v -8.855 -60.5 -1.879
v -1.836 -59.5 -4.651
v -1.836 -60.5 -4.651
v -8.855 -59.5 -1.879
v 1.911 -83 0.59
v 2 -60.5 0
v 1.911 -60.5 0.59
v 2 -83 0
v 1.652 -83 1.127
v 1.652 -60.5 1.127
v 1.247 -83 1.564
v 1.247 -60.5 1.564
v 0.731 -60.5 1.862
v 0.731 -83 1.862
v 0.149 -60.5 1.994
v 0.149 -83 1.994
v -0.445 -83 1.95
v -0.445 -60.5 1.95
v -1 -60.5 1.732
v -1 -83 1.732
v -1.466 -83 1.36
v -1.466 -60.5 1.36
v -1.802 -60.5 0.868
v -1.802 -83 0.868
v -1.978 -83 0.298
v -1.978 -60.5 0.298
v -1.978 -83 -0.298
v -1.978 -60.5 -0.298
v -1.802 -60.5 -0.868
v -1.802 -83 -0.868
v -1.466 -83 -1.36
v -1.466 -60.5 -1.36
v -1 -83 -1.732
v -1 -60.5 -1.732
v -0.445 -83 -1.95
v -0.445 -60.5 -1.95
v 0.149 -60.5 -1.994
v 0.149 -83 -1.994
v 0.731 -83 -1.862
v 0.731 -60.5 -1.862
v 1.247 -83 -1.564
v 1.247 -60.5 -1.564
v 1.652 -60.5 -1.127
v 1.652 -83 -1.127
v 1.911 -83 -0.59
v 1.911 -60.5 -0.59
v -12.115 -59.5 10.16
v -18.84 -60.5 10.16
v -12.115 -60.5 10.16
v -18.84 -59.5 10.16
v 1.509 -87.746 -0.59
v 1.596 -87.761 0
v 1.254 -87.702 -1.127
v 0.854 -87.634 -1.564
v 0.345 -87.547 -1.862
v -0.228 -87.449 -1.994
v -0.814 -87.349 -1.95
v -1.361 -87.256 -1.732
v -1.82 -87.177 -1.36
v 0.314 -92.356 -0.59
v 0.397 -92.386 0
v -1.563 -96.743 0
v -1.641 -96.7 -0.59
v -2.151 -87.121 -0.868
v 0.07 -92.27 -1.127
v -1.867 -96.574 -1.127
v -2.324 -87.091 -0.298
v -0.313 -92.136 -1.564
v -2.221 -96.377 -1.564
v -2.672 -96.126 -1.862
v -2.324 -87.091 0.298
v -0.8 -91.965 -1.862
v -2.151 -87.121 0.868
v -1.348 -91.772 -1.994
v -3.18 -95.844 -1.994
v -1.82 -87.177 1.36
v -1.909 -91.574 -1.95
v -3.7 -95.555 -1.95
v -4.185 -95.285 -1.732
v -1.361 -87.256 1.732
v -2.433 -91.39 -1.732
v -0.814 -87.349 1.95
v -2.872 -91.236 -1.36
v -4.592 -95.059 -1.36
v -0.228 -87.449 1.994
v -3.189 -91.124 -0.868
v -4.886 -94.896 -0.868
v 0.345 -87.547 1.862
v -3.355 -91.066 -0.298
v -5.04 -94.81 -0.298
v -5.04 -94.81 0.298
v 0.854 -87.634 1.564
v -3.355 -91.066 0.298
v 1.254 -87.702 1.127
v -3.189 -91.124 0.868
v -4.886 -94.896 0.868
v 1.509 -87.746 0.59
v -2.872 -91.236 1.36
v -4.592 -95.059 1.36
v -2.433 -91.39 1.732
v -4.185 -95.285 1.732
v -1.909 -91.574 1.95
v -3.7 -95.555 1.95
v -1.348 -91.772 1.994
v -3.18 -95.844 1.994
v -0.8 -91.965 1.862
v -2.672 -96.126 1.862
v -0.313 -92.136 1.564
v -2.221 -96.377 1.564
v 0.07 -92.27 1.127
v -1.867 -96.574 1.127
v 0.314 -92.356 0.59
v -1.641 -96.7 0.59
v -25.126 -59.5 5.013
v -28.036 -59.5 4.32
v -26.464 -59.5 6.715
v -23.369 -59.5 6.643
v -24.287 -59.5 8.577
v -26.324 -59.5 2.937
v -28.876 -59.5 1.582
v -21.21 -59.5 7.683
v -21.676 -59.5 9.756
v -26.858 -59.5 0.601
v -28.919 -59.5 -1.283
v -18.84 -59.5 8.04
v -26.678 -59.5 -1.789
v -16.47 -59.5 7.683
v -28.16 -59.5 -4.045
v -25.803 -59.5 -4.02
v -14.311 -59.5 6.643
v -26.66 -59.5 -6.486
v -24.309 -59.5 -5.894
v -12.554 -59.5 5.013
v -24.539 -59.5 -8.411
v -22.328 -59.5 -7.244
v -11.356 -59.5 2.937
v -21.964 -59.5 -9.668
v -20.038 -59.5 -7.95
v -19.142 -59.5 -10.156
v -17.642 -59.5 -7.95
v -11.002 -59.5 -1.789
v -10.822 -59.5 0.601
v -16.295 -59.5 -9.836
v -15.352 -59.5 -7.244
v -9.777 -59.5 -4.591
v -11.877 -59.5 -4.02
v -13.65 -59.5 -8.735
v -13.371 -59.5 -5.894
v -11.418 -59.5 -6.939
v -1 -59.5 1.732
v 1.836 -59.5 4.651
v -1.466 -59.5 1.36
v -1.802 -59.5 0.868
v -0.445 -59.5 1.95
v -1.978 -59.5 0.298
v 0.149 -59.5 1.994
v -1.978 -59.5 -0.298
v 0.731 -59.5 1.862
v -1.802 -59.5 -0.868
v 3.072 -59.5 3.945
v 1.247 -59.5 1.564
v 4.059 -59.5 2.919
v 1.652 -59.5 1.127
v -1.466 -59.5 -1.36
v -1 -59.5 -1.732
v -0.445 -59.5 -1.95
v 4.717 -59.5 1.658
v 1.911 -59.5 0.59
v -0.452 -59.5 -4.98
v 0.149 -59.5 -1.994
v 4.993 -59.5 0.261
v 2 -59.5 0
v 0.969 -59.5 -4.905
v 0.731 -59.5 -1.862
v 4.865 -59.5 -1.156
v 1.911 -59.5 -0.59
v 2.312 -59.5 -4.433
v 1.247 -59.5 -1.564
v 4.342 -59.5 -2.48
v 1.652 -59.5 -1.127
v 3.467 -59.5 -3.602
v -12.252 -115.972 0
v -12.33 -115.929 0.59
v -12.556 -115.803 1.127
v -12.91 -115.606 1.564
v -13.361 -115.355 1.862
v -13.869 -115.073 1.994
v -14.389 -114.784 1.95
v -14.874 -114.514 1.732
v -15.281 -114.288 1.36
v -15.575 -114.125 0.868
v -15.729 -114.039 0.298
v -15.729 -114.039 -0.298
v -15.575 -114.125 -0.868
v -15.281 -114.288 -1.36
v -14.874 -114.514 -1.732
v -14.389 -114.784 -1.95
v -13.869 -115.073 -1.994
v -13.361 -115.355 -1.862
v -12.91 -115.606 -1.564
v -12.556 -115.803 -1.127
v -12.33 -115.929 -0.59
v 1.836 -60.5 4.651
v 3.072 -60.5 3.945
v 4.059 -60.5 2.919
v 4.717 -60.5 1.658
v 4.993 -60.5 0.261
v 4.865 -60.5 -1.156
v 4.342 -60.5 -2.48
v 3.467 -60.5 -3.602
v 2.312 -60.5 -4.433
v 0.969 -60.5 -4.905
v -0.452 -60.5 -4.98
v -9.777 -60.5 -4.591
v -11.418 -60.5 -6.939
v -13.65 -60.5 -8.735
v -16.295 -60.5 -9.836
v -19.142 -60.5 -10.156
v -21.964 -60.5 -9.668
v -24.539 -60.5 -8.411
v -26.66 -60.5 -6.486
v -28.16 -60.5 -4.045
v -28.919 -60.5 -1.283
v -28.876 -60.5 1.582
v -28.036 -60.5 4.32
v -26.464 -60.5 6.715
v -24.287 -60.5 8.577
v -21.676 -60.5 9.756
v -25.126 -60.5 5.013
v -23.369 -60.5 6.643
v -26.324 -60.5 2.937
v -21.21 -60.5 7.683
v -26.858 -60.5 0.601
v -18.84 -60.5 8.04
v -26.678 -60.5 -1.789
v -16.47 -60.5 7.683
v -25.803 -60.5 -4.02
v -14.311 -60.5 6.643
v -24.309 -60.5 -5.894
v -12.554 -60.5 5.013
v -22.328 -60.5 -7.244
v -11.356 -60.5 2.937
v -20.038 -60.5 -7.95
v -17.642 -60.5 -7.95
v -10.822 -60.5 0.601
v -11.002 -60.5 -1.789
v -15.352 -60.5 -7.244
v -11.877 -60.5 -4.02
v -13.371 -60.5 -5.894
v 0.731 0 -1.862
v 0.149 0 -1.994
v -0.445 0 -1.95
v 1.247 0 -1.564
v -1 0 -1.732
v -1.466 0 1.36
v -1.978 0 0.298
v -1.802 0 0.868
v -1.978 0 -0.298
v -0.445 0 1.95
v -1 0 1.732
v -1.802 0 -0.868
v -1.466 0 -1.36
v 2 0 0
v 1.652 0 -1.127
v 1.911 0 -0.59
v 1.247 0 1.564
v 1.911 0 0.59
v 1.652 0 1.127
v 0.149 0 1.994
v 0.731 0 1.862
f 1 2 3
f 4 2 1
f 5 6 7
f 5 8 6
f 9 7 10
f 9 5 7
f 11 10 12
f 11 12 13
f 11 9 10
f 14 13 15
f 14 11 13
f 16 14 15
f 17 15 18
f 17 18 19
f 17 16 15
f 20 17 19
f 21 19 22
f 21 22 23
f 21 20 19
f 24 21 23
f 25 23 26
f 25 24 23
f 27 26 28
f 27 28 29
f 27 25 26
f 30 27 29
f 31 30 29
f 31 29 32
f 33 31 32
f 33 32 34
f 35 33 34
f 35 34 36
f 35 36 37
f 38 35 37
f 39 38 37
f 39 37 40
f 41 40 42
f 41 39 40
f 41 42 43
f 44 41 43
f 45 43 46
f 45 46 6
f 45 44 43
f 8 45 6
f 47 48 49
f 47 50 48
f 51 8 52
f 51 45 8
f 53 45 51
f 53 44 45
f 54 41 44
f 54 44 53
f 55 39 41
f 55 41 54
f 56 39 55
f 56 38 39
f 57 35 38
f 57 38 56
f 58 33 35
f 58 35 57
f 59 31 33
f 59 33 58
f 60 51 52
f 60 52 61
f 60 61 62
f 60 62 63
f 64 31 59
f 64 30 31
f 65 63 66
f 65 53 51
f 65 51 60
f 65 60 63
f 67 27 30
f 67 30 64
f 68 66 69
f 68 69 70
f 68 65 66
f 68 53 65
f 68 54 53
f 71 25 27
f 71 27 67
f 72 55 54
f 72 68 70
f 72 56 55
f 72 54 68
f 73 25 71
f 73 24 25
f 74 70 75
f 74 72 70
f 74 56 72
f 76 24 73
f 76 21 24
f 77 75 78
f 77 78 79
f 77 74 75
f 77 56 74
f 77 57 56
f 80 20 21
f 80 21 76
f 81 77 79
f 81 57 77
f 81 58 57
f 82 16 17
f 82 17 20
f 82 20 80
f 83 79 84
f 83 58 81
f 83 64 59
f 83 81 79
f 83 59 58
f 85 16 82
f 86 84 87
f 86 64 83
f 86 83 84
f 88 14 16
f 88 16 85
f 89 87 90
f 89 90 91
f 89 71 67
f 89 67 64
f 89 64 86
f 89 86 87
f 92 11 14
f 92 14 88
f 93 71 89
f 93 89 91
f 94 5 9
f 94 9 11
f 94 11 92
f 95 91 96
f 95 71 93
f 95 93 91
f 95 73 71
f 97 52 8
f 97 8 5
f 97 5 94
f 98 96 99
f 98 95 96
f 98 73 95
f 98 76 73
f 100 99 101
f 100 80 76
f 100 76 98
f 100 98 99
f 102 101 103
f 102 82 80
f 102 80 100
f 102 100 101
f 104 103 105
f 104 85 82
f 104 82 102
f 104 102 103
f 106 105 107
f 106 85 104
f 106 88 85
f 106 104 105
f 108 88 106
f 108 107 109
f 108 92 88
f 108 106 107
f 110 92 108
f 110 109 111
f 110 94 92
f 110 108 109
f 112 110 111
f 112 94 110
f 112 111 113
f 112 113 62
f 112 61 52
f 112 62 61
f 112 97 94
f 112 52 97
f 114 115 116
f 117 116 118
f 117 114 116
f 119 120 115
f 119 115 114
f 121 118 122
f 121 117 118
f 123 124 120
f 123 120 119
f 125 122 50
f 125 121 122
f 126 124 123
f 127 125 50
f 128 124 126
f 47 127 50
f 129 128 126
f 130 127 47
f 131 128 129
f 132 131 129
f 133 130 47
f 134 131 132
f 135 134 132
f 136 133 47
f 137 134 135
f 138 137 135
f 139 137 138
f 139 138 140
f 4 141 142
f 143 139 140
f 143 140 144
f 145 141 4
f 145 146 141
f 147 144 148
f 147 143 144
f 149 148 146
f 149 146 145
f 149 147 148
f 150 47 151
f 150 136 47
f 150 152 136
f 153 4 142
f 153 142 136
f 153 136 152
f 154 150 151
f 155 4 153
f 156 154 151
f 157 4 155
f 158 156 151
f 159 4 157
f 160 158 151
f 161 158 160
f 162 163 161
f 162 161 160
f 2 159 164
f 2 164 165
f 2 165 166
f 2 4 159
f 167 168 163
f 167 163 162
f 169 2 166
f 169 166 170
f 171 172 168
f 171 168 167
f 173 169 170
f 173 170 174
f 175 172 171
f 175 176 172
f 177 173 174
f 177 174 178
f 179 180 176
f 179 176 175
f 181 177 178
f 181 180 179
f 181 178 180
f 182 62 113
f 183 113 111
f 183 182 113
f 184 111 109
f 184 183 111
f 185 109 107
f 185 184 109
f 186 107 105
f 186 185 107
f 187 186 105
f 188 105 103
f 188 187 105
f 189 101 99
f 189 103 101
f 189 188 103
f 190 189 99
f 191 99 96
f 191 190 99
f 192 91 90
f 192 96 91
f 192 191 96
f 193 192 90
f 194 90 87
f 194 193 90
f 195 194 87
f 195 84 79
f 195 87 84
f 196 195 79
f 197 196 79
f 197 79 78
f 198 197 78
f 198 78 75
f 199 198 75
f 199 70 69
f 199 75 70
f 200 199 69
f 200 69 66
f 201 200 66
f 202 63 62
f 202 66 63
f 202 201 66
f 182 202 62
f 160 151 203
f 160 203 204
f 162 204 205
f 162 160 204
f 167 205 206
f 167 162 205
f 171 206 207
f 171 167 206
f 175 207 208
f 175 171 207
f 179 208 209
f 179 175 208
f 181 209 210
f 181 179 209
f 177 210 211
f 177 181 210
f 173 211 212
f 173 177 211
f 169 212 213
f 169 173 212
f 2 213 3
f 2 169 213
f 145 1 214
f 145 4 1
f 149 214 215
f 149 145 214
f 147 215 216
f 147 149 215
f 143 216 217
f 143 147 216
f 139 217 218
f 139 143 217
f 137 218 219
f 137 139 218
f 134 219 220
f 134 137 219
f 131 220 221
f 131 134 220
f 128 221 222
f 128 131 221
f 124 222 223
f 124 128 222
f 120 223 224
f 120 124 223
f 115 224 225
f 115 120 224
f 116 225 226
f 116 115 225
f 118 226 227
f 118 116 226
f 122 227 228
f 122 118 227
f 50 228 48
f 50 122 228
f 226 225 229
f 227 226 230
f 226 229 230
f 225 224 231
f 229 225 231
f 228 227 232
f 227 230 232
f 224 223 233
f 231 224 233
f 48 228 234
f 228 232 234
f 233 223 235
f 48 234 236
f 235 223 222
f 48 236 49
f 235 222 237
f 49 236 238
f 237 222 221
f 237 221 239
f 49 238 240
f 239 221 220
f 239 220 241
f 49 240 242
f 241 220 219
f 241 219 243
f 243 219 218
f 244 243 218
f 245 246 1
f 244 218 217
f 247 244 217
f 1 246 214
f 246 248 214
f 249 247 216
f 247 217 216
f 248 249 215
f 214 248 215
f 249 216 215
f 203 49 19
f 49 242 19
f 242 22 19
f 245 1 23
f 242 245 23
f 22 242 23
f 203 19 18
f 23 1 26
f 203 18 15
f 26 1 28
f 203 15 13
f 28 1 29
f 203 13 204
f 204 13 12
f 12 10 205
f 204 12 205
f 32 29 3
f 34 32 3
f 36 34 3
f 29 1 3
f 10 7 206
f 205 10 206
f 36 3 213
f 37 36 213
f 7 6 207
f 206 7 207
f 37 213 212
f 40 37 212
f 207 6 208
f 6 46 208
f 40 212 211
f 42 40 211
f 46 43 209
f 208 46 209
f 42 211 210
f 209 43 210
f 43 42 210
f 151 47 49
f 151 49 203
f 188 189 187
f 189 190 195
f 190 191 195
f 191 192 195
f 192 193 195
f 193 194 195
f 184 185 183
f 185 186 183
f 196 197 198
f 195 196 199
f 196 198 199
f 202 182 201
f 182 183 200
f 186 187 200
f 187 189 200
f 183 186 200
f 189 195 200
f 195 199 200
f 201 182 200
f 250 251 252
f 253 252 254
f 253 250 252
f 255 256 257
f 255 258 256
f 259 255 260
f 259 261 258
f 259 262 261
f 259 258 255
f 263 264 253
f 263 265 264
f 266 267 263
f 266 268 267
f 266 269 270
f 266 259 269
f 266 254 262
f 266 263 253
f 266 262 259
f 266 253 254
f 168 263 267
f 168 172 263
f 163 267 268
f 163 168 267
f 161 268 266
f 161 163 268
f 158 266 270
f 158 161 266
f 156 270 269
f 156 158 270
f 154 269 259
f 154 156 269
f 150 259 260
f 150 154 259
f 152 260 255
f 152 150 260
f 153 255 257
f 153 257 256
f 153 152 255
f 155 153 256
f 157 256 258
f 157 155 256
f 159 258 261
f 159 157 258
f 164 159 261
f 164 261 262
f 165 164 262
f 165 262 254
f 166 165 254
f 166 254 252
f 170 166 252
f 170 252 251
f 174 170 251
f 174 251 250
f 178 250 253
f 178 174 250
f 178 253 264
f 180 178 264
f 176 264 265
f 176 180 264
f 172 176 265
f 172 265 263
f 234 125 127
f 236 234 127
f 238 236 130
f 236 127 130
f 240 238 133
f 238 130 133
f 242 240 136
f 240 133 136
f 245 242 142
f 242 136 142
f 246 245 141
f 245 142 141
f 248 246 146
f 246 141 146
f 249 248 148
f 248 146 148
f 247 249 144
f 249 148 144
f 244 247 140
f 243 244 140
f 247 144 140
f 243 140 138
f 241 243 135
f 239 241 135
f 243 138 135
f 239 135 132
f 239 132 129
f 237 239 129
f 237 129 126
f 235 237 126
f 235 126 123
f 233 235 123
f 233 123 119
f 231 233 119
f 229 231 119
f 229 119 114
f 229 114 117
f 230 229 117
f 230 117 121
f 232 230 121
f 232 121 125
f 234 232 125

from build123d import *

# Parameters (mm, degrees)
SKETCH4_R           = 2
BOSS_EXTRUDE1_DEPTH = 0.5
CUT_EXTRUDE1_REACH  = 68.966
SKETCH6_R           = 8.04


with BuildPart() as part:
    # Sweep1: sweep along a path in Sketch2
    with BuildLine(Plane.XY) as sweep1_path:
        Line((0, 0), (0, -83))
        ThreePointArc((0, -83), (-0.841224391, -89.596719602), (-3.311053985, -95.771208226))
        Line((-3.311053985, -95.771208226), (-14, -115))
    # Sketch4 → Sweep1 (sweep)
    with BuildSketch(Plane(origin=(0, 0, 0), x_dir=(1, 0, 0), z_dir=(0, 1, 0))):
        Circle(SKETCH4_R)
    sweep(path=sweep1_path.line)

    # Sketch5 → Boss-Extrude1 (add, symmetric)
    with BuildSketch(Plane(origin=(0, -60, 0), x_dir=(1, 0, 0), z_dir=(0, 1, 0))):
        with BuildLine():
            Line((-18.84, -10.16), (-12.115048494, -10.16))
            Line((-12.115048494, -10.16), (1.836495151, -4.650514548))
            ThreePointArc((1.836495151, -4.650514548), (4.650514548, 1.836495151), (-1.836495151, 4.650514548))
            Line((-1.836495151, 4.650514548), (-8.855227327, 1.878806714))
            ThreePointArc((-8.855227327, 1.878806714), (-26.660302942, 6.486020497), (-18.84, -10.16))
        make_face()
    extrude(amount=BOSS_EXTRUDE1_DEPTH, both=True)

    # Sketch6 → Cut-Extrude1 (cut, up to next)
    with BuildSketch(Plane(origin=(0, -59.5, 0), x_dir=(1, 0, 0), z_dir=(0, 1, 0)), mode=Mode.PRIVATE) as cut_extrude1_sk1:
        with Locations(Location((-18.84, 0, 0), (0, 0, 270))):
            Circle(SKETCH6_R)
    cut_extrude1_tool1 = extrude(cut_extrude1_sk1.sketch, amount=-CUT_EXTRUDE1_REACH, mode=Mode.PRIVATE) & part.part
    add(cut_extrude1_tool1.solids().sort_by_distance((-18.84, -59.5, 0))[0], mode=Mode.SUBTRACT)


solid = part.part
